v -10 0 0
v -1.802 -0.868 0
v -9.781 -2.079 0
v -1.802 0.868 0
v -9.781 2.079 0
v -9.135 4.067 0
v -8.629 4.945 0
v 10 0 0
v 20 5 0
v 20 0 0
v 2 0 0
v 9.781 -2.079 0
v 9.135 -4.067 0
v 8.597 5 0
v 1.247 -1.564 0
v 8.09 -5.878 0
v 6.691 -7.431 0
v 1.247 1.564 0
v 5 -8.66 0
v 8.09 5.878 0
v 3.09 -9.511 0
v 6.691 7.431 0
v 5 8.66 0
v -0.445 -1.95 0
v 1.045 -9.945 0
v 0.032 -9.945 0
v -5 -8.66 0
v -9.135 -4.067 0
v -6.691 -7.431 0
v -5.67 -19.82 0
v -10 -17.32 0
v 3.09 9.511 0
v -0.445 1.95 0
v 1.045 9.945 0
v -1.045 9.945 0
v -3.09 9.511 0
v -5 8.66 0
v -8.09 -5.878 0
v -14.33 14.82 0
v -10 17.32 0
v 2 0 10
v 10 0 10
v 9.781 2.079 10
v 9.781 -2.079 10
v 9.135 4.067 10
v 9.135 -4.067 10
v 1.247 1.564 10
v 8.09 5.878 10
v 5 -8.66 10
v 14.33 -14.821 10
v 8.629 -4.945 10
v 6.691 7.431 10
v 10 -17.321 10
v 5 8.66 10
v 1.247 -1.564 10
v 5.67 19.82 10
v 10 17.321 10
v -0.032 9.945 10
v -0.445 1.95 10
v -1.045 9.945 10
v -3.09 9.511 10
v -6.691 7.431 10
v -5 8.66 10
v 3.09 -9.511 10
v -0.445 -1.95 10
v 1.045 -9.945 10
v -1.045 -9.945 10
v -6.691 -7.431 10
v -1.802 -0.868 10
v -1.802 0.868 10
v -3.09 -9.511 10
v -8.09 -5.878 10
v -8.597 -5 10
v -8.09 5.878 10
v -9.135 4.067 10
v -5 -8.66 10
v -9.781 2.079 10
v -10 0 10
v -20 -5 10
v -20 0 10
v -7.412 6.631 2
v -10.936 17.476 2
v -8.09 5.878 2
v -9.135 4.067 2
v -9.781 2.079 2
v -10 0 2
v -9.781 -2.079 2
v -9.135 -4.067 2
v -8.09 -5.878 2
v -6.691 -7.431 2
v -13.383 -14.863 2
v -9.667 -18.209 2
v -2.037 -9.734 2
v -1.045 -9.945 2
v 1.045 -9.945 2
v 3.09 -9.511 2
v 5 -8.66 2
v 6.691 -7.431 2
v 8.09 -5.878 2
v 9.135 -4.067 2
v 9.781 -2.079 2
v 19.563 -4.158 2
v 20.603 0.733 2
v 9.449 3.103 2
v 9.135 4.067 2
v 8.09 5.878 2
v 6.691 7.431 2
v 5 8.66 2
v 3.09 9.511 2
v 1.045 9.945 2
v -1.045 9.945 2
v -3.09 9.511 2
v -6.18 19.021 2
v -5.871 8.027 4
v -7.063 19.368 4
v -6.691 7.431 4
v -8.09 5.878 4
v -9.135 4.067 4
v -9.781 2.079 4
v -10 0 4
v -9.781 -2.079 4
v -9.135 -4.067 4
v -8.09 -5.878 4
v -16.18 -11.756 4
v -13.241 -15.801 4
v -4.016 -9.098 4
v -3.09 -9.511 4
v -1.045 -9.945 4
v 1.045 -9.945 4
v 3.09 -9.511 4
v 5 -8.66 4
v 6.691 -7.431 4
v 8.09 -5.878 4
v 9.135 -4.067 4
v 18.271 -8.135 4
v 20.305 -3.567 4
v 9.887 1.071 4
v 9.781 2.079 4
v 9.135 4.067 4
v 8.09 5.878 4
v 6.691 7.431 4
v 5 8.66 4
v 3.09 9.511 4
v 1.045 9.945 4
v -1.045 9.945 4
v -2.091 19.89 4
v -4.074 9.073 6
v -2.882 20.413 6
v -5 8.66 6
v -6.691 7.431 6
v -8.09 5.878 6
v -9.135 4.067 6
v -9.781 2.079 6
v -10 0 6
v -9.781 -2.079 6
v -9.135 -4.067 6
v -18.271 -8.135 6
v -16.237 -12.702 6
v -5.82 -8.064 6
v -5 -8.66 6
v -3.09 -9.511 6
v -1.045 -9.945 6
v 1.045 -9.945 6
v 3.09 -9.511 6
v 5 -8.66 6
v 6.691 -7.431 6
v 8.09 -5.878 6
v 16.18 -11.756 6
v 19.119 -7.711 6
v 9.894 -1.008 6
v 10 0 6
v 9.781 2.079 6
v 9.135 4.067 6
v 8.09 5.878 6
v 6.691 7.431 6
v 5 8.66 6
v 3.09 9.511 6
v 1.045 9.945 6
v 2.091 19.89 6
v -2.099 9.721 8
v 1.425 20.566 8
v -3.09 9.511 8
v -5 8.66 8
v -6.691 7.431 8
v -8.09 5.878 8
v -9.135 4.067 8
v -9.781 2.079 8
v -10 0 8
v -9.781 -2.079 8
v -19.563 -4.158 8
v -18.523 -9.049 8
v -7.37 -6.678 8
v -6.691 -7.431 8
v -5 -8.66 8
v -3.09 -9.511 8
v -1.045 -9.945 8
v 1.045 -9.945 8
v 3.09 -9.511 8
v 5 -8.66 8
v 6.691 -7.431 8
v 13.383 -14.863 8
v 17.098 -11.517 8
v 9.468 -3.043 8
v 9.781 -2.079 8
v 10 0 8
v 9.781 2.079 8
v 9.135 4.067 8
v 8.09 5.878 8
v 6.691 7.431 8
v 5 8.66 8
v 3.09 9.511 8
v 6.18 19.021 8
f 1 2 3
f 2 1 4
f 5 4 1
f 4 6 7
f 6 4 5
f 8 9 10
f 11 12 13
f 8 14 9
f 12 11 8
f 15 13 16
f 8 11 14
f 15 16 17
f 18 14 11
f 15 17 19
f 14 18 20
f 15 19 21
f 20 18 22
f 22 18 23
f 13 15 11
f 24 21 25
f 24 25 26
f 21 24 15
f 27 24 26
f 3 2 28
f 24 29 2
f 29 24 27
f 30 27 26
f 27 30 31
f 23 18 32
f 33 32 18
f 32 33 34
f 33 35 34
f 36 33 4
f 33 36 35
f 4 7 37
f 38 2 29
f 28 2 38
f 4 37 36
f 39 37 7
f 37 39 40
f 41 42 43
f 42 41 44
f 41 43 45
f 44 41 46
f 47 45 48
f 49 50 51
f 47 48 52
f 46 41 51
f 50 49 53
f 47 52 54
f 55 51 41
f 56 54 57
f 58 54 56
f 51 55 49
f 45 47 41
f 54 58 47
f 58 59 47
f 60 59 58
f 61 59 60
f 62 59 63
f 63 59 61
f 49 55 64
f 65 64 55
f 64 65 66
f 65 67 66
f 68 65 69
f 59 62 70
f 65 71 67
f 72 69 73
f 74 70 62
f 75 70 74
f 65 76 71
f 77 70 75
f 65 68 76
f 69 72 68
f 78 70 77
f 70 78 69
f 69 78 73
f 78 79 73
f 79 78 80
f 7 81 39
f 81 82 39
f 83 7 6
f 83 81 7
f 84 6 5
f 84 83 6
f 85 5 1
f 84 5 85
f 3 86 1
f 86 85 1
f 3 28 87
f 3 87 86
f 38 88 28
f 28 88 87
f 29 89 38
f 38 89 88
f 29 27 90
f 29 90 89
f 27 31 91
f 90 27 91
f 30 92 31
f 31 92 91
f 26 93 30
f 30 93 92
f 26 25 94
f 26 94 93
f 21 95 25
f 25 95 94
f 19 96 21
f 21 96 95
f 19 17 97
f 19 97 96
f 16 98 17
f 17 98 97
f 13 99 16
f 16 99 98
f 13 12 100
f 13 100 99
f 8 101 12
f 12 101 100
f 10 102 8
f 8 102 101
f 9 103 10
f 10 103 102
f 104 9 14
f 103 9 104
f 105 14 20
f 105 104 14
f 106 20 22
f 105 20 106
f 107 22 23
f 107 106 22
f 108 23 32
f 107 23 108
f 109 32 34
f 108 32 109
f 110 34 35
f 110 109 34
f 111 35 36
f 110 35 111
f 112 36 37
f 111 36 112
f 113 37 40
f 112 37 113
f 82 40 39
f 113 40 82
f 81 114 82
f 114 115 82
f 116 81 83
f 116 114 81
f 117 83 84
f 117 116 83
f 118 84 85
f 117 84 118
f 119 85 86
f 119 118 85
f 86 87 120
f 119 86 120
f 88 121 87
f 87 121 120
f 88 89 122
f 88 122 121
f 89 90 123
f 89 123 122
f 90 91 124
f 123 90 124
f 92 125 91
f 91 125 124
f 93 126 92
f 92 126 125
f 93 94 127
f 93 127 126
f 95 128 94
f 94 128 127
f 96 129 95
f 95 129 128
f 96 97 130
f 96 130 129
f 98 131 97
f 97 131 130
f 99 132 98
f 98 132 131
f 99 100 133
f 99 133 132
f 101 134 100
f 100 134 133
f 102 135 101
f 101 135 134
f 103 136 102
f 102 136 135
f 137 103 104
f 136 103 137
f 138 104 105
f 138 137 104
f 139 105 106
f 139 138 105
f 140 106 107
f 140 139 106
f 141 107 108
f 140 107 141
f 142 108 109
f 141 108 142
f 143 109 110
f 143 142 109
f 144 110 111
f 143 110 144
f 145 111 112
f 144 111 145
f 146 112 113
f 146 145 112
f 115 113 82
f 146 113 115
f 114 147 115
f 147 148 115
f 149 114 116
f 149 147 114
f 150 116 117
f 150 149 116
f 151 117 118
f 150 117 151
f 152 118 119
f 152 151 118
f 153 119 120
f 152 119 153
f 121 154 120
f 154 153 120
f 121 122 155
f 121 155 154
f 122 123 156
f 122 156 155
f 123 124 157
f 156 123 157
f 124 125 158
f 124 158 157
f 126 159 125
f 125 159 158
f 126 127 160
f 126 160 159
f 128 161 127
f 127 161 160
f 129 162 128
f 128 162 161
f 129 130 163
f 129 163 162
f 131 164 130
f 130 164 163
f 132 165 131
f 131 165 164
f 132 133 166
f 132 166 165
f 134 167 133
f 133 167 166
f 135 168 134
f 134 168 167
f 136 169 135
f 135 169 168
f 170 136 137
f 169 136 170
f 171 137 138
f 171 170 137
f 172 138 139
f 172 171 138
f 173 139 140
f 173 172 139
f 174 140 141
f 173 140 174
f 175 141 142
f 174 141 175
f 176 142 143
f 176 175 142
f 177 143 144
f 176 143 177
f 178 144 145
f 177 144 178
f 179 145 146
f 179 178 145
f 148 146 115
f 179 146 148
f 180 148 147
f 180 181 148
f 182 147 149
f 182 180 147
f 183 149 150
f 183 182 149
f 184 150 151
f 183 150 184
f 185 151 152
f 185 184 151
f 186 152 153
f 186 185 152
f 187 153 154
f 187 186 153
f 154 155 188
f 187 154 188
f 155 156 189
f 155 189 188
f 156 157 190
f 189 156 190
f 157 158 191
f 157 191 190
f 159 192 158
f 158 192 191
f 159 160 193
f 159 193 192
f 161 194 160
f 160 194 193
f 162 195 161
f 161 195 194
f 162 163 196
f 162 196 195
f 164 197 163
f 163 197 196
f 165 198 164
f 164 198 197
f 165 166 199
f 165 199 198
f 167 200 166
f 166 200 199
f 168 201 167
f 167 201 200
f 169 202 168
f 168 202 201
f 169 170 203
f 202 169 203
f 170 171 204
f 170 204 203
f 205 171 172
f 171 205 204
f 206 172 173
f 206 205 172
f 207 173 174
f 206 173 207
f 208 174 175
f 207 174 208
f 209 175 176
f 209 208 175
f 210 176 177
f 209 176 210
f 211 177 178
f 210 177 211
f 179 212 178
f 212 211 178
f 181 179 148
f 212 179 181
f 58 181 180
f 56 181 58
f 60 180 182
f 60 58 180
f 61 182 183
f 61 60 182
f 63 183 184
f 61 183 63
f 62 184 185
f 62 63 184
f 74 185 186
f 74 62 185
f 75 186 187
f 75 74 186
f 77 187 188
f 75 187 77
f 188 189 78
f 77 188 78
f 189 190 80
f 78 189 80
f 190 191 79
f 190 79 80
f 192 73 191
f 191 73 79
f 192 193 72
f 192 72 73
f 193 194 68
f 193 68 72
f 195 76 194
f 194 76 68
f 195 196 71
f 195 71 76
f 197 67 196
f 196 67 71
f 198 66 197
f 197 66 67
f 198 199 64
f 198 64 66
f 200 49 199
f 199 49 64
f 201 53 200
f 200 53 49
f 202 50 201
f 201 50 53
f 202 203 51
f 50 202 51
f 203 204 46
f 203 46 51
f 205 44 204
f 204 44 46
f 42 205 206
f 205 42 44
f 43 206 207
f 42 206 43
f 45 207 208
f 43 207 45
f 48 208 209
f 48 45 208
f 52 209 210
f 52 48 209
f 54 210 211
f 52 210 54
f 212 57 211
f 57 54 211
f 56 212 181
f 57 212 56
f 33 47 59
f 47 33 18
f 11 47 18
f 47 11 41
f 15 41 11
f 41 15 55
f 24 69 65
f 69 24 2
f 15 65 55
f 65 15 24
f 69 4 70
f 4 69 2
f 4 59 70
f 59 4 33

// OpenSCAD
/* OpenSCAD Workshop

Example showing a basic impeller Part done using 2d primitives.

*/


module impeller(pitch, height){
	difference(){
		union(){
			linear_extrude(height=height, twist = pitch)blade(20,3);			
		}
		translate([0,0,-1])cylinder(r=2, h = height + 2);
	}
}


//blade(radius, fin count)
module blade(r,t){
	union(){
		for(i = [0:360/t:360])
			rotate([0,0,i])square([r,5]);
		circle(r=r/2);
	}
}

impeller(60, 10);
